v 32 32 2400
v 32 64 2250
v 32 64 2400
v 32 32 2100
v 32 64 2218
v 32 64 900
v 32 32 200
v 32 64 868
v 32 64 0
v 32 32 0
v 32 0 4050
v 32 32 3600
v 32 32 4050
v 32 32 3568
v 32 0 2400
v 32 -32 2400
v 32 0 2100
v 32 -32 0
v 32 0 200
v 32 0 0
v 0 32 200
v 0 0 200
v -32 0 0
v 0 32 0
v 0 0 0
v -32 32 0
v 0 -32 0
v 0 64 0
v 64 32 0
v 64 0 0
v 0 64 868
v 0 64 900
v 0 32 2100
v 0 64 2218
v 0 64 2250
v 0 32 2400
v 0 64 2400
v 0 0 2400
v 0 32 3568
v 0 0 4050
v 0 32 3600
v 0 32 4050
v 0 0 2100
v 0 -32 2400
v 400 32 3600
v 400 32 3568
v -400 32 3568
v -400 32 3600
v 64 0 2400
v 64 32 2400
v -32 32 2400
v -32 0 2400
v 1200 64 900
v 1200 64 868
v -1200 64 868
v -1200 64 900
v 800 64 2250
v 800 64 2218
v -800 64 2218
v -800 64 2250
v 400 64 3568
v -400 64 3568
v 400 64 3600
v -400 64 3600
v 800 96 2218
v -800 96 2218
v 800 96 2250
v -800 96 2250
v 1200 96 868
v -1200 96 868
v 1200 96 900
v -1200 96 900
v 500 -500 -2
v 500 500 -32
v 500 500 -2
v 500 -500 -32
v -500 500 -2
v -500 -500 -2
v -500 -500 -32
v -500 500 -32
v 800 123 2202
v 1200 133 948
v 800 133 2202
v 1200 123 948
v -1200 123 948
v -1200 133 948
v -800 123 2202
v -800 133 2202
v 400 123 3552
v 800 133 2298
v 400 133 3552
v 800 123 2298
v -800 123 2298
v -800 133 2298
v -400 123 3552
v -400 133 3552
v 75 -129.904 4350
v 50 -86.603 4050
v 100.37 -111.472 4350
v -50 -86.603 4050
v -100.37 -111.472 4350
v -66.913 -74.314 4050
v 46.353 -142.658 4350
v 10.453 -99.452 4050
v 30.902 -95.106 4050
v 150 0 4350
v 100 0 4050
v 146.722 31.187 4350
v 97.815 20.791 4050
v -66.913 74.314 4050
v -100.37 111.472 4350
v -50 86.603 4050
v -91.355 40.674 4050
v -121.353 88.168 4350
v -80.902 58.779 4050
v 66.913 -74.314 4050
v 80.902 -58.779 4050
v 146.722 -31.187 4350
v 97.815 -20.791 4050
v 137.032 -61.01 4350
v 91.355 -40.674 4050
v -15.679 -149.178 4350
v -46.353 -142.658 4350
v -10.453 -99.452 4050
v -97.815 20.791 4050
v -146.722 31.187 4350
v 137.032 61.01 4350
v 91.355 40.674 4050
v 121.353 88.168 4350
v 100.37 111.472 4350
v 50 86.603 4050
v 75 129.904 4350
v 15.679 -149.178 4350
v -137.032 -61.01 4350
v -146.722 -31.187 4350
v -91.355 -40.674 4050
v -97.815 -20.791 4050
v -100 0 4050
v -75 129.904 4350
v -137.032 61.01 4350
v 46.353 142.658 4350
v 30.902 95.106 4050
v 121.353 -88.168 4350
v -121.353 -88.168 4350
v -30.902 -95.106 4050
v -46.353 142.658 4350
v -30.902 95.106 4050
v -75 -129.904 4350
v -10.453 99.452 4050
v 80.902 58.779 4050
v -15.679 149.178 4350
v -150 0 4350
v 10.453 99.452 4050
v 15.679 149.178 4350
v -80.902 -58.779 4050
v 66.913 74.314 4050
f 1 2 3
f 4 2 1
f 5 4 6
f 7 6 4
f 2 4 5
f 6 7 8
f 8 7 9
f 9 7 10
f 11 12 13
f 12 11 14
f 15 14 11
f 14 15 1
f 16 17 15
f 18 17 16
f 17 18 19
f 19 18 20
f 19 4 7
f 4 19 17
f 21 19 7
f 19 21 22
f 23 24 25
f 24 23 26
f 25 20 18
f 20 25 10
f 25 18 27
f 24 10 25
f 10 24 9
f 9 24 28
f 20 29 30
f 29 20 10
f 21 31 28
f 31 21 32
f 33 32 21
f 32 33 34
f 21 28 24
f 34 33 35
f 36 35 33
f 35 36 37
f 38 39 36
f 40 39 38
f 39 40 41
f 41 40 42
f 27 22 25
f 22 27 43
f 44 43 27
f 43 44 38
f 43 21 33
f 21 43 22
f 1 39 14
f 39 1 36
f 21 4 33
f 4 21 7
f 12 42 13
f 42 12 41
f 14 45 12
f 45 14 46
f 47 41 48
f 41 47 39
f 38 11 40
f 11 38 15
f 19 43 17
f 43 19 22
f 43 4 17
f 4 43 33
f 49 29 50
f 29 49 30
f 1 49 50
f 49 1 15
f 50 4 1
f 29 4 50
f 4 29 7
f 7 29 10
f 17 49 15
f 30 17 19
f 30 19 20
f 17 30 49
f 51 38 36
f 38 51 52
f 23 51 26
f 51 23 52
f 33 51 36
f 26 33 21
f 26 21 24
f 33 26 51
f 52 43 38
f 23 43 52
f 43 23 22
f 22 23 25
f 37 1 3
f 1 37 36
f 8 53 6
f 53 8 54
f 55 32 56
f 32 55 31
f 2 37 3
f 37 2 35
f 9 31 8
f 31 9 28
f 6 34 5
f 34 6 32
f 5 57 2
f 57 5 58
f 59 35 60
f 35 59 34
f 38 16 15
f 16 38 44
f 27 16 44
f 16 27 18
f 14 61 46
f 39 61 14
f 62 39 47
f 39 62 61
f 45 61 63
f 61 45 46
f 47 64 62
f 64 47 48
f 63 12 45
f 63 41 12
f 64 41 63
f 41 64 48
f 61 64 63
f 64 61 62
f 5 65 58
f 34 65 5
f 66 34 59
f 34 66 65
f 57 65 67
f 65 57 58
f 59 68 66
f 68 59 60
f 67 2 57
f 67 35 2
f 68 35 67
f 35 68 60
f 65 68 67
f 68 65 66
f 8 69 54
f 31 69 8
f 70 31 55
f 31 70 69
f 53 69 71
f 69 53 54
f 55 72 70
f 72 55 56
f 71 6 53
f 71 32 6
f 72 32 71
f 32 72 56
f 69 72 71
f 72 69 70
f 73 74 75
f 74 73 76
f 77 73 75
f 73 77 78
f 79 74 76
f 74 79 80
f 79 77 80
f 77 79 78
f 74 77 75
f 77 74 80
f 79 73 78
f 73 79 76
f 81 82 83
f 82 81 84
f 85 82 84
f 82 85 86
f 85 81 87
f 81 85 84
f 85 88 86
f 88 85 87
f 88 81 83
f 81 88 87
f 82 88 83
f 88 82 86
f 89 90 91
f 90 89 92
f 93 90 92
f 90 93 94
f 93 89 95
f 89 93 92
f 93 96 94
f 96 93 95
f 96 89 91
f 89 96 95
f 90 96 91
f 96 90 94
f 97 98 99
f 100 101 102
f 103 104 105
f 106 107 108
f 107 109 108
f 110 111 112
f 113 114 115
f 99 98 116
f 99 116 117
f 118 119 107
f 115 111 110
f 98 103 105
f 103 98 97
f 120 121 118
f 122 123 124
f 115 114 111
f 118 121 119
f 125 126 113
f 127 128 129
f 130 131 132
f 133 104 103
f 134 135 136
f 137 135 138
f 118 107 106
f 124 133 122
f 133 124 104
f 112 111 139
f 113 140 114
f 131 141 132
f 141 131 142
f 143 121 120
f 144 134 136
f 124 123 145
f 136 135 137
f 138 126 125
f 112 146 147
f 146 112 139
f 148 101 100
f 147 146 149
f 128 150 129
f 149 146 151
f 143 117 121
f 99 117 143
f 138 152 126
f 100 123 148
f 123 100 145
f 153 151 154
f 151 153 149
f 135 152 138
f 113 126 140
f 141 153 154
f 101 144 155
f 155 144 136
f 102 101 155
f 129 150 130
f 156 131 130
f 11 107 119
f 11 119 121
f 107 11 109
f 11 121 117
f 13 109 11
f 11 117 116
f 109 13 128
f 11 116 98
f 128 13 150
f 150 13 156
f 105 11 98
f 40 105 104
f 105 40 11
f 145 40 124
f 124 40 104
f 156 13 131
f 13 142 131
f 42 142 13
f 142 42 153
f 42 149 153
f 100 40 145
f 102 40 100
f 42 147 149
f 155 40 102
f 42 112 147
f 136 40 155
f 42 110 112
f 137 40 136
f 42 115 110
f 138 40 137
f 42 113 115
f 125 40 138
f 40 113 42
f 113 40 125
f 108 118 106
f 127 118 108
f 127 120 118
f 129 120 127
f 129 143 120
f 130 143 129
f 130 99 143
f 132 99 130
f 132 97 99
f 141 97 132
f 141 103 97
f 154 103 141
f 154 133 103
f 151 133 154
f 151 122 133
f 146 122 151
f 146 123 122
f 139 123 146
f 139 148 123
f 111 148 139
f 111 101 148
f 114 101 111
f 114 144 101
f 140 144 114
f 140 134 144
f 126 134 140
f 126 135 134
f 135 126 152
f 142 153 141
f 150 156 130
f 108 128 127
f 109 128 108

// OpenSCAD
//Longueur de tasseau (mm)
H1=2400;
//Eppaisseur du Tasseau(mm)
LTasseau=32;
//arete du socle carré (mm)
LSocle=1000;
//eppaisseur du socle (mm)
ESocle=30;

HSolide=H1/8;
H2=H1-HSolide;

echo("HAUTEUR TOTALE :",(H1-HSolide)*2,"mm");
echo("liste de courses : ");
echo("   Seau de ",H1/8/10,"cm de hauteur, par ",H1/8/3*2/10,"x",H1/8/10,"cm de diametre");
echo("   Tasseaux de ",H1/1000,"m : 5");
echo("   Tasseaux de ",H2/1000,"m : 1");
echo("   Tasseaux de ",HSolide/10,"cm : 1");
echo("   Tasseaux de ",H1/3/1000,"m : 1");
echo("   Tasseaux de ",H1/5*4/1000,"m : 1");
echo("   Tasseaux de ",H1/5*2.5/1000,"m : 1");
echo("   Tasseaux de ",H1/5/1000,"m : 1");
echo("   4 equerres metalliques");
echo("   16 vis,boulons, rondelles x2 superieur à ",3*LTasseau,"mm (Fixation du mat)");
echo("   8 vis,boulons, rondelles x2 superieur à ",ESocle+10,"mm  (fixation du mat au socle)");
echo("   2 vis,boulons, rondelles x2 superieur à ",4*LTasseau,"mm  (fixation des voiles basses)");
echo("   1 vis,boulons, rondelles x2 superieur à ",2*LTasseau,"mm  (fixation des voiles Hautes)");
echo("Voile N°1 :",H1/3*2/1000,"m en haut, ",H1/1000,"m en bas, sur ",(((H1+H2)/5*2.5-(H1+H2)/5)-3*LTasseau)/1000,"m de haut");
echo("Voile N°2 :",H1/3/1000,"m en haut, ",H1/3*2/1000,"m en bas, sur ",(((H1+H2)/5*2.5-(H1+H2)/5)-3*LTasseau)/1000,"m de haut");
echo("la Vigie sera agrafée...");

module Voile(LongHaut,LongBas,Hauteur){
    lh=LongHaut/2;
    lb=LongBas/2;
    h=Hauteur;
    rotate([90,0,0]) linear_extrude(height=10,center=true,convexity=10,twist=0) polygon([[-lb,0],[lb,0],[lh,h],[-lh,h]],center=true);
}

module Tasseau(x) 
{
    cube([LTasseau,LTasseau,x]);
};

module Vigie(h){
    cylinder(h,h/3,h/2,center=true);
}

color("Red") {
    Tasseau(200);
    translate([0,0,H2]) Tasseau(H2);
}

color("Orange") translate([LTasseau,0,0]) Tasseau(H1);
color("Orange") translate([-LTasseau,0,0]) Tasseau(H1);
color("Orange") translate([0,LTasseau,0]) Tasseau(H1);
color("Orange") translate([0,-LTasseau,0]) Tasseau(H1);

color("cyan") translate([-H1/6,LTasseau,(H1+H2)/5*4]) rotate([0,90,0]) Tasseau(H1/3);

color("blue") translate([-H1/3,LTasseau*2,(H1+H2)/5*2.5]) rotate([0,90,0]) Tasseau(H1/3*2);


color("green") translate([-H1/2,LTasseau*2,(H1+H2)/5]) rotate([0,90,0]) Tasseau(H1);

color("pink") translate([-LSocle/2,-LSocle/2,-LTasseau]) cube([LSocle,LSocle,ESocle]);

color("White") translate ([0,LTasseau*4,(H1+H2)/5+1.5*LTasseau]) Voile(H1/3*2,H1,((H1+H2)/5*2.5-(H1+H2)/5)-3*LTasseau);

color("White") translate ([0,LTasseau*4,(H1+H2)/5*2.5+1.5*LTasseau]) Voile(H1/3,H1/3*2,((H1+H2)/5*2.5-(H1+H2)/5)-3*LTasseau);

color("Red") translate([0,0,2*H1/8*7]) Vigie(H1/8);
